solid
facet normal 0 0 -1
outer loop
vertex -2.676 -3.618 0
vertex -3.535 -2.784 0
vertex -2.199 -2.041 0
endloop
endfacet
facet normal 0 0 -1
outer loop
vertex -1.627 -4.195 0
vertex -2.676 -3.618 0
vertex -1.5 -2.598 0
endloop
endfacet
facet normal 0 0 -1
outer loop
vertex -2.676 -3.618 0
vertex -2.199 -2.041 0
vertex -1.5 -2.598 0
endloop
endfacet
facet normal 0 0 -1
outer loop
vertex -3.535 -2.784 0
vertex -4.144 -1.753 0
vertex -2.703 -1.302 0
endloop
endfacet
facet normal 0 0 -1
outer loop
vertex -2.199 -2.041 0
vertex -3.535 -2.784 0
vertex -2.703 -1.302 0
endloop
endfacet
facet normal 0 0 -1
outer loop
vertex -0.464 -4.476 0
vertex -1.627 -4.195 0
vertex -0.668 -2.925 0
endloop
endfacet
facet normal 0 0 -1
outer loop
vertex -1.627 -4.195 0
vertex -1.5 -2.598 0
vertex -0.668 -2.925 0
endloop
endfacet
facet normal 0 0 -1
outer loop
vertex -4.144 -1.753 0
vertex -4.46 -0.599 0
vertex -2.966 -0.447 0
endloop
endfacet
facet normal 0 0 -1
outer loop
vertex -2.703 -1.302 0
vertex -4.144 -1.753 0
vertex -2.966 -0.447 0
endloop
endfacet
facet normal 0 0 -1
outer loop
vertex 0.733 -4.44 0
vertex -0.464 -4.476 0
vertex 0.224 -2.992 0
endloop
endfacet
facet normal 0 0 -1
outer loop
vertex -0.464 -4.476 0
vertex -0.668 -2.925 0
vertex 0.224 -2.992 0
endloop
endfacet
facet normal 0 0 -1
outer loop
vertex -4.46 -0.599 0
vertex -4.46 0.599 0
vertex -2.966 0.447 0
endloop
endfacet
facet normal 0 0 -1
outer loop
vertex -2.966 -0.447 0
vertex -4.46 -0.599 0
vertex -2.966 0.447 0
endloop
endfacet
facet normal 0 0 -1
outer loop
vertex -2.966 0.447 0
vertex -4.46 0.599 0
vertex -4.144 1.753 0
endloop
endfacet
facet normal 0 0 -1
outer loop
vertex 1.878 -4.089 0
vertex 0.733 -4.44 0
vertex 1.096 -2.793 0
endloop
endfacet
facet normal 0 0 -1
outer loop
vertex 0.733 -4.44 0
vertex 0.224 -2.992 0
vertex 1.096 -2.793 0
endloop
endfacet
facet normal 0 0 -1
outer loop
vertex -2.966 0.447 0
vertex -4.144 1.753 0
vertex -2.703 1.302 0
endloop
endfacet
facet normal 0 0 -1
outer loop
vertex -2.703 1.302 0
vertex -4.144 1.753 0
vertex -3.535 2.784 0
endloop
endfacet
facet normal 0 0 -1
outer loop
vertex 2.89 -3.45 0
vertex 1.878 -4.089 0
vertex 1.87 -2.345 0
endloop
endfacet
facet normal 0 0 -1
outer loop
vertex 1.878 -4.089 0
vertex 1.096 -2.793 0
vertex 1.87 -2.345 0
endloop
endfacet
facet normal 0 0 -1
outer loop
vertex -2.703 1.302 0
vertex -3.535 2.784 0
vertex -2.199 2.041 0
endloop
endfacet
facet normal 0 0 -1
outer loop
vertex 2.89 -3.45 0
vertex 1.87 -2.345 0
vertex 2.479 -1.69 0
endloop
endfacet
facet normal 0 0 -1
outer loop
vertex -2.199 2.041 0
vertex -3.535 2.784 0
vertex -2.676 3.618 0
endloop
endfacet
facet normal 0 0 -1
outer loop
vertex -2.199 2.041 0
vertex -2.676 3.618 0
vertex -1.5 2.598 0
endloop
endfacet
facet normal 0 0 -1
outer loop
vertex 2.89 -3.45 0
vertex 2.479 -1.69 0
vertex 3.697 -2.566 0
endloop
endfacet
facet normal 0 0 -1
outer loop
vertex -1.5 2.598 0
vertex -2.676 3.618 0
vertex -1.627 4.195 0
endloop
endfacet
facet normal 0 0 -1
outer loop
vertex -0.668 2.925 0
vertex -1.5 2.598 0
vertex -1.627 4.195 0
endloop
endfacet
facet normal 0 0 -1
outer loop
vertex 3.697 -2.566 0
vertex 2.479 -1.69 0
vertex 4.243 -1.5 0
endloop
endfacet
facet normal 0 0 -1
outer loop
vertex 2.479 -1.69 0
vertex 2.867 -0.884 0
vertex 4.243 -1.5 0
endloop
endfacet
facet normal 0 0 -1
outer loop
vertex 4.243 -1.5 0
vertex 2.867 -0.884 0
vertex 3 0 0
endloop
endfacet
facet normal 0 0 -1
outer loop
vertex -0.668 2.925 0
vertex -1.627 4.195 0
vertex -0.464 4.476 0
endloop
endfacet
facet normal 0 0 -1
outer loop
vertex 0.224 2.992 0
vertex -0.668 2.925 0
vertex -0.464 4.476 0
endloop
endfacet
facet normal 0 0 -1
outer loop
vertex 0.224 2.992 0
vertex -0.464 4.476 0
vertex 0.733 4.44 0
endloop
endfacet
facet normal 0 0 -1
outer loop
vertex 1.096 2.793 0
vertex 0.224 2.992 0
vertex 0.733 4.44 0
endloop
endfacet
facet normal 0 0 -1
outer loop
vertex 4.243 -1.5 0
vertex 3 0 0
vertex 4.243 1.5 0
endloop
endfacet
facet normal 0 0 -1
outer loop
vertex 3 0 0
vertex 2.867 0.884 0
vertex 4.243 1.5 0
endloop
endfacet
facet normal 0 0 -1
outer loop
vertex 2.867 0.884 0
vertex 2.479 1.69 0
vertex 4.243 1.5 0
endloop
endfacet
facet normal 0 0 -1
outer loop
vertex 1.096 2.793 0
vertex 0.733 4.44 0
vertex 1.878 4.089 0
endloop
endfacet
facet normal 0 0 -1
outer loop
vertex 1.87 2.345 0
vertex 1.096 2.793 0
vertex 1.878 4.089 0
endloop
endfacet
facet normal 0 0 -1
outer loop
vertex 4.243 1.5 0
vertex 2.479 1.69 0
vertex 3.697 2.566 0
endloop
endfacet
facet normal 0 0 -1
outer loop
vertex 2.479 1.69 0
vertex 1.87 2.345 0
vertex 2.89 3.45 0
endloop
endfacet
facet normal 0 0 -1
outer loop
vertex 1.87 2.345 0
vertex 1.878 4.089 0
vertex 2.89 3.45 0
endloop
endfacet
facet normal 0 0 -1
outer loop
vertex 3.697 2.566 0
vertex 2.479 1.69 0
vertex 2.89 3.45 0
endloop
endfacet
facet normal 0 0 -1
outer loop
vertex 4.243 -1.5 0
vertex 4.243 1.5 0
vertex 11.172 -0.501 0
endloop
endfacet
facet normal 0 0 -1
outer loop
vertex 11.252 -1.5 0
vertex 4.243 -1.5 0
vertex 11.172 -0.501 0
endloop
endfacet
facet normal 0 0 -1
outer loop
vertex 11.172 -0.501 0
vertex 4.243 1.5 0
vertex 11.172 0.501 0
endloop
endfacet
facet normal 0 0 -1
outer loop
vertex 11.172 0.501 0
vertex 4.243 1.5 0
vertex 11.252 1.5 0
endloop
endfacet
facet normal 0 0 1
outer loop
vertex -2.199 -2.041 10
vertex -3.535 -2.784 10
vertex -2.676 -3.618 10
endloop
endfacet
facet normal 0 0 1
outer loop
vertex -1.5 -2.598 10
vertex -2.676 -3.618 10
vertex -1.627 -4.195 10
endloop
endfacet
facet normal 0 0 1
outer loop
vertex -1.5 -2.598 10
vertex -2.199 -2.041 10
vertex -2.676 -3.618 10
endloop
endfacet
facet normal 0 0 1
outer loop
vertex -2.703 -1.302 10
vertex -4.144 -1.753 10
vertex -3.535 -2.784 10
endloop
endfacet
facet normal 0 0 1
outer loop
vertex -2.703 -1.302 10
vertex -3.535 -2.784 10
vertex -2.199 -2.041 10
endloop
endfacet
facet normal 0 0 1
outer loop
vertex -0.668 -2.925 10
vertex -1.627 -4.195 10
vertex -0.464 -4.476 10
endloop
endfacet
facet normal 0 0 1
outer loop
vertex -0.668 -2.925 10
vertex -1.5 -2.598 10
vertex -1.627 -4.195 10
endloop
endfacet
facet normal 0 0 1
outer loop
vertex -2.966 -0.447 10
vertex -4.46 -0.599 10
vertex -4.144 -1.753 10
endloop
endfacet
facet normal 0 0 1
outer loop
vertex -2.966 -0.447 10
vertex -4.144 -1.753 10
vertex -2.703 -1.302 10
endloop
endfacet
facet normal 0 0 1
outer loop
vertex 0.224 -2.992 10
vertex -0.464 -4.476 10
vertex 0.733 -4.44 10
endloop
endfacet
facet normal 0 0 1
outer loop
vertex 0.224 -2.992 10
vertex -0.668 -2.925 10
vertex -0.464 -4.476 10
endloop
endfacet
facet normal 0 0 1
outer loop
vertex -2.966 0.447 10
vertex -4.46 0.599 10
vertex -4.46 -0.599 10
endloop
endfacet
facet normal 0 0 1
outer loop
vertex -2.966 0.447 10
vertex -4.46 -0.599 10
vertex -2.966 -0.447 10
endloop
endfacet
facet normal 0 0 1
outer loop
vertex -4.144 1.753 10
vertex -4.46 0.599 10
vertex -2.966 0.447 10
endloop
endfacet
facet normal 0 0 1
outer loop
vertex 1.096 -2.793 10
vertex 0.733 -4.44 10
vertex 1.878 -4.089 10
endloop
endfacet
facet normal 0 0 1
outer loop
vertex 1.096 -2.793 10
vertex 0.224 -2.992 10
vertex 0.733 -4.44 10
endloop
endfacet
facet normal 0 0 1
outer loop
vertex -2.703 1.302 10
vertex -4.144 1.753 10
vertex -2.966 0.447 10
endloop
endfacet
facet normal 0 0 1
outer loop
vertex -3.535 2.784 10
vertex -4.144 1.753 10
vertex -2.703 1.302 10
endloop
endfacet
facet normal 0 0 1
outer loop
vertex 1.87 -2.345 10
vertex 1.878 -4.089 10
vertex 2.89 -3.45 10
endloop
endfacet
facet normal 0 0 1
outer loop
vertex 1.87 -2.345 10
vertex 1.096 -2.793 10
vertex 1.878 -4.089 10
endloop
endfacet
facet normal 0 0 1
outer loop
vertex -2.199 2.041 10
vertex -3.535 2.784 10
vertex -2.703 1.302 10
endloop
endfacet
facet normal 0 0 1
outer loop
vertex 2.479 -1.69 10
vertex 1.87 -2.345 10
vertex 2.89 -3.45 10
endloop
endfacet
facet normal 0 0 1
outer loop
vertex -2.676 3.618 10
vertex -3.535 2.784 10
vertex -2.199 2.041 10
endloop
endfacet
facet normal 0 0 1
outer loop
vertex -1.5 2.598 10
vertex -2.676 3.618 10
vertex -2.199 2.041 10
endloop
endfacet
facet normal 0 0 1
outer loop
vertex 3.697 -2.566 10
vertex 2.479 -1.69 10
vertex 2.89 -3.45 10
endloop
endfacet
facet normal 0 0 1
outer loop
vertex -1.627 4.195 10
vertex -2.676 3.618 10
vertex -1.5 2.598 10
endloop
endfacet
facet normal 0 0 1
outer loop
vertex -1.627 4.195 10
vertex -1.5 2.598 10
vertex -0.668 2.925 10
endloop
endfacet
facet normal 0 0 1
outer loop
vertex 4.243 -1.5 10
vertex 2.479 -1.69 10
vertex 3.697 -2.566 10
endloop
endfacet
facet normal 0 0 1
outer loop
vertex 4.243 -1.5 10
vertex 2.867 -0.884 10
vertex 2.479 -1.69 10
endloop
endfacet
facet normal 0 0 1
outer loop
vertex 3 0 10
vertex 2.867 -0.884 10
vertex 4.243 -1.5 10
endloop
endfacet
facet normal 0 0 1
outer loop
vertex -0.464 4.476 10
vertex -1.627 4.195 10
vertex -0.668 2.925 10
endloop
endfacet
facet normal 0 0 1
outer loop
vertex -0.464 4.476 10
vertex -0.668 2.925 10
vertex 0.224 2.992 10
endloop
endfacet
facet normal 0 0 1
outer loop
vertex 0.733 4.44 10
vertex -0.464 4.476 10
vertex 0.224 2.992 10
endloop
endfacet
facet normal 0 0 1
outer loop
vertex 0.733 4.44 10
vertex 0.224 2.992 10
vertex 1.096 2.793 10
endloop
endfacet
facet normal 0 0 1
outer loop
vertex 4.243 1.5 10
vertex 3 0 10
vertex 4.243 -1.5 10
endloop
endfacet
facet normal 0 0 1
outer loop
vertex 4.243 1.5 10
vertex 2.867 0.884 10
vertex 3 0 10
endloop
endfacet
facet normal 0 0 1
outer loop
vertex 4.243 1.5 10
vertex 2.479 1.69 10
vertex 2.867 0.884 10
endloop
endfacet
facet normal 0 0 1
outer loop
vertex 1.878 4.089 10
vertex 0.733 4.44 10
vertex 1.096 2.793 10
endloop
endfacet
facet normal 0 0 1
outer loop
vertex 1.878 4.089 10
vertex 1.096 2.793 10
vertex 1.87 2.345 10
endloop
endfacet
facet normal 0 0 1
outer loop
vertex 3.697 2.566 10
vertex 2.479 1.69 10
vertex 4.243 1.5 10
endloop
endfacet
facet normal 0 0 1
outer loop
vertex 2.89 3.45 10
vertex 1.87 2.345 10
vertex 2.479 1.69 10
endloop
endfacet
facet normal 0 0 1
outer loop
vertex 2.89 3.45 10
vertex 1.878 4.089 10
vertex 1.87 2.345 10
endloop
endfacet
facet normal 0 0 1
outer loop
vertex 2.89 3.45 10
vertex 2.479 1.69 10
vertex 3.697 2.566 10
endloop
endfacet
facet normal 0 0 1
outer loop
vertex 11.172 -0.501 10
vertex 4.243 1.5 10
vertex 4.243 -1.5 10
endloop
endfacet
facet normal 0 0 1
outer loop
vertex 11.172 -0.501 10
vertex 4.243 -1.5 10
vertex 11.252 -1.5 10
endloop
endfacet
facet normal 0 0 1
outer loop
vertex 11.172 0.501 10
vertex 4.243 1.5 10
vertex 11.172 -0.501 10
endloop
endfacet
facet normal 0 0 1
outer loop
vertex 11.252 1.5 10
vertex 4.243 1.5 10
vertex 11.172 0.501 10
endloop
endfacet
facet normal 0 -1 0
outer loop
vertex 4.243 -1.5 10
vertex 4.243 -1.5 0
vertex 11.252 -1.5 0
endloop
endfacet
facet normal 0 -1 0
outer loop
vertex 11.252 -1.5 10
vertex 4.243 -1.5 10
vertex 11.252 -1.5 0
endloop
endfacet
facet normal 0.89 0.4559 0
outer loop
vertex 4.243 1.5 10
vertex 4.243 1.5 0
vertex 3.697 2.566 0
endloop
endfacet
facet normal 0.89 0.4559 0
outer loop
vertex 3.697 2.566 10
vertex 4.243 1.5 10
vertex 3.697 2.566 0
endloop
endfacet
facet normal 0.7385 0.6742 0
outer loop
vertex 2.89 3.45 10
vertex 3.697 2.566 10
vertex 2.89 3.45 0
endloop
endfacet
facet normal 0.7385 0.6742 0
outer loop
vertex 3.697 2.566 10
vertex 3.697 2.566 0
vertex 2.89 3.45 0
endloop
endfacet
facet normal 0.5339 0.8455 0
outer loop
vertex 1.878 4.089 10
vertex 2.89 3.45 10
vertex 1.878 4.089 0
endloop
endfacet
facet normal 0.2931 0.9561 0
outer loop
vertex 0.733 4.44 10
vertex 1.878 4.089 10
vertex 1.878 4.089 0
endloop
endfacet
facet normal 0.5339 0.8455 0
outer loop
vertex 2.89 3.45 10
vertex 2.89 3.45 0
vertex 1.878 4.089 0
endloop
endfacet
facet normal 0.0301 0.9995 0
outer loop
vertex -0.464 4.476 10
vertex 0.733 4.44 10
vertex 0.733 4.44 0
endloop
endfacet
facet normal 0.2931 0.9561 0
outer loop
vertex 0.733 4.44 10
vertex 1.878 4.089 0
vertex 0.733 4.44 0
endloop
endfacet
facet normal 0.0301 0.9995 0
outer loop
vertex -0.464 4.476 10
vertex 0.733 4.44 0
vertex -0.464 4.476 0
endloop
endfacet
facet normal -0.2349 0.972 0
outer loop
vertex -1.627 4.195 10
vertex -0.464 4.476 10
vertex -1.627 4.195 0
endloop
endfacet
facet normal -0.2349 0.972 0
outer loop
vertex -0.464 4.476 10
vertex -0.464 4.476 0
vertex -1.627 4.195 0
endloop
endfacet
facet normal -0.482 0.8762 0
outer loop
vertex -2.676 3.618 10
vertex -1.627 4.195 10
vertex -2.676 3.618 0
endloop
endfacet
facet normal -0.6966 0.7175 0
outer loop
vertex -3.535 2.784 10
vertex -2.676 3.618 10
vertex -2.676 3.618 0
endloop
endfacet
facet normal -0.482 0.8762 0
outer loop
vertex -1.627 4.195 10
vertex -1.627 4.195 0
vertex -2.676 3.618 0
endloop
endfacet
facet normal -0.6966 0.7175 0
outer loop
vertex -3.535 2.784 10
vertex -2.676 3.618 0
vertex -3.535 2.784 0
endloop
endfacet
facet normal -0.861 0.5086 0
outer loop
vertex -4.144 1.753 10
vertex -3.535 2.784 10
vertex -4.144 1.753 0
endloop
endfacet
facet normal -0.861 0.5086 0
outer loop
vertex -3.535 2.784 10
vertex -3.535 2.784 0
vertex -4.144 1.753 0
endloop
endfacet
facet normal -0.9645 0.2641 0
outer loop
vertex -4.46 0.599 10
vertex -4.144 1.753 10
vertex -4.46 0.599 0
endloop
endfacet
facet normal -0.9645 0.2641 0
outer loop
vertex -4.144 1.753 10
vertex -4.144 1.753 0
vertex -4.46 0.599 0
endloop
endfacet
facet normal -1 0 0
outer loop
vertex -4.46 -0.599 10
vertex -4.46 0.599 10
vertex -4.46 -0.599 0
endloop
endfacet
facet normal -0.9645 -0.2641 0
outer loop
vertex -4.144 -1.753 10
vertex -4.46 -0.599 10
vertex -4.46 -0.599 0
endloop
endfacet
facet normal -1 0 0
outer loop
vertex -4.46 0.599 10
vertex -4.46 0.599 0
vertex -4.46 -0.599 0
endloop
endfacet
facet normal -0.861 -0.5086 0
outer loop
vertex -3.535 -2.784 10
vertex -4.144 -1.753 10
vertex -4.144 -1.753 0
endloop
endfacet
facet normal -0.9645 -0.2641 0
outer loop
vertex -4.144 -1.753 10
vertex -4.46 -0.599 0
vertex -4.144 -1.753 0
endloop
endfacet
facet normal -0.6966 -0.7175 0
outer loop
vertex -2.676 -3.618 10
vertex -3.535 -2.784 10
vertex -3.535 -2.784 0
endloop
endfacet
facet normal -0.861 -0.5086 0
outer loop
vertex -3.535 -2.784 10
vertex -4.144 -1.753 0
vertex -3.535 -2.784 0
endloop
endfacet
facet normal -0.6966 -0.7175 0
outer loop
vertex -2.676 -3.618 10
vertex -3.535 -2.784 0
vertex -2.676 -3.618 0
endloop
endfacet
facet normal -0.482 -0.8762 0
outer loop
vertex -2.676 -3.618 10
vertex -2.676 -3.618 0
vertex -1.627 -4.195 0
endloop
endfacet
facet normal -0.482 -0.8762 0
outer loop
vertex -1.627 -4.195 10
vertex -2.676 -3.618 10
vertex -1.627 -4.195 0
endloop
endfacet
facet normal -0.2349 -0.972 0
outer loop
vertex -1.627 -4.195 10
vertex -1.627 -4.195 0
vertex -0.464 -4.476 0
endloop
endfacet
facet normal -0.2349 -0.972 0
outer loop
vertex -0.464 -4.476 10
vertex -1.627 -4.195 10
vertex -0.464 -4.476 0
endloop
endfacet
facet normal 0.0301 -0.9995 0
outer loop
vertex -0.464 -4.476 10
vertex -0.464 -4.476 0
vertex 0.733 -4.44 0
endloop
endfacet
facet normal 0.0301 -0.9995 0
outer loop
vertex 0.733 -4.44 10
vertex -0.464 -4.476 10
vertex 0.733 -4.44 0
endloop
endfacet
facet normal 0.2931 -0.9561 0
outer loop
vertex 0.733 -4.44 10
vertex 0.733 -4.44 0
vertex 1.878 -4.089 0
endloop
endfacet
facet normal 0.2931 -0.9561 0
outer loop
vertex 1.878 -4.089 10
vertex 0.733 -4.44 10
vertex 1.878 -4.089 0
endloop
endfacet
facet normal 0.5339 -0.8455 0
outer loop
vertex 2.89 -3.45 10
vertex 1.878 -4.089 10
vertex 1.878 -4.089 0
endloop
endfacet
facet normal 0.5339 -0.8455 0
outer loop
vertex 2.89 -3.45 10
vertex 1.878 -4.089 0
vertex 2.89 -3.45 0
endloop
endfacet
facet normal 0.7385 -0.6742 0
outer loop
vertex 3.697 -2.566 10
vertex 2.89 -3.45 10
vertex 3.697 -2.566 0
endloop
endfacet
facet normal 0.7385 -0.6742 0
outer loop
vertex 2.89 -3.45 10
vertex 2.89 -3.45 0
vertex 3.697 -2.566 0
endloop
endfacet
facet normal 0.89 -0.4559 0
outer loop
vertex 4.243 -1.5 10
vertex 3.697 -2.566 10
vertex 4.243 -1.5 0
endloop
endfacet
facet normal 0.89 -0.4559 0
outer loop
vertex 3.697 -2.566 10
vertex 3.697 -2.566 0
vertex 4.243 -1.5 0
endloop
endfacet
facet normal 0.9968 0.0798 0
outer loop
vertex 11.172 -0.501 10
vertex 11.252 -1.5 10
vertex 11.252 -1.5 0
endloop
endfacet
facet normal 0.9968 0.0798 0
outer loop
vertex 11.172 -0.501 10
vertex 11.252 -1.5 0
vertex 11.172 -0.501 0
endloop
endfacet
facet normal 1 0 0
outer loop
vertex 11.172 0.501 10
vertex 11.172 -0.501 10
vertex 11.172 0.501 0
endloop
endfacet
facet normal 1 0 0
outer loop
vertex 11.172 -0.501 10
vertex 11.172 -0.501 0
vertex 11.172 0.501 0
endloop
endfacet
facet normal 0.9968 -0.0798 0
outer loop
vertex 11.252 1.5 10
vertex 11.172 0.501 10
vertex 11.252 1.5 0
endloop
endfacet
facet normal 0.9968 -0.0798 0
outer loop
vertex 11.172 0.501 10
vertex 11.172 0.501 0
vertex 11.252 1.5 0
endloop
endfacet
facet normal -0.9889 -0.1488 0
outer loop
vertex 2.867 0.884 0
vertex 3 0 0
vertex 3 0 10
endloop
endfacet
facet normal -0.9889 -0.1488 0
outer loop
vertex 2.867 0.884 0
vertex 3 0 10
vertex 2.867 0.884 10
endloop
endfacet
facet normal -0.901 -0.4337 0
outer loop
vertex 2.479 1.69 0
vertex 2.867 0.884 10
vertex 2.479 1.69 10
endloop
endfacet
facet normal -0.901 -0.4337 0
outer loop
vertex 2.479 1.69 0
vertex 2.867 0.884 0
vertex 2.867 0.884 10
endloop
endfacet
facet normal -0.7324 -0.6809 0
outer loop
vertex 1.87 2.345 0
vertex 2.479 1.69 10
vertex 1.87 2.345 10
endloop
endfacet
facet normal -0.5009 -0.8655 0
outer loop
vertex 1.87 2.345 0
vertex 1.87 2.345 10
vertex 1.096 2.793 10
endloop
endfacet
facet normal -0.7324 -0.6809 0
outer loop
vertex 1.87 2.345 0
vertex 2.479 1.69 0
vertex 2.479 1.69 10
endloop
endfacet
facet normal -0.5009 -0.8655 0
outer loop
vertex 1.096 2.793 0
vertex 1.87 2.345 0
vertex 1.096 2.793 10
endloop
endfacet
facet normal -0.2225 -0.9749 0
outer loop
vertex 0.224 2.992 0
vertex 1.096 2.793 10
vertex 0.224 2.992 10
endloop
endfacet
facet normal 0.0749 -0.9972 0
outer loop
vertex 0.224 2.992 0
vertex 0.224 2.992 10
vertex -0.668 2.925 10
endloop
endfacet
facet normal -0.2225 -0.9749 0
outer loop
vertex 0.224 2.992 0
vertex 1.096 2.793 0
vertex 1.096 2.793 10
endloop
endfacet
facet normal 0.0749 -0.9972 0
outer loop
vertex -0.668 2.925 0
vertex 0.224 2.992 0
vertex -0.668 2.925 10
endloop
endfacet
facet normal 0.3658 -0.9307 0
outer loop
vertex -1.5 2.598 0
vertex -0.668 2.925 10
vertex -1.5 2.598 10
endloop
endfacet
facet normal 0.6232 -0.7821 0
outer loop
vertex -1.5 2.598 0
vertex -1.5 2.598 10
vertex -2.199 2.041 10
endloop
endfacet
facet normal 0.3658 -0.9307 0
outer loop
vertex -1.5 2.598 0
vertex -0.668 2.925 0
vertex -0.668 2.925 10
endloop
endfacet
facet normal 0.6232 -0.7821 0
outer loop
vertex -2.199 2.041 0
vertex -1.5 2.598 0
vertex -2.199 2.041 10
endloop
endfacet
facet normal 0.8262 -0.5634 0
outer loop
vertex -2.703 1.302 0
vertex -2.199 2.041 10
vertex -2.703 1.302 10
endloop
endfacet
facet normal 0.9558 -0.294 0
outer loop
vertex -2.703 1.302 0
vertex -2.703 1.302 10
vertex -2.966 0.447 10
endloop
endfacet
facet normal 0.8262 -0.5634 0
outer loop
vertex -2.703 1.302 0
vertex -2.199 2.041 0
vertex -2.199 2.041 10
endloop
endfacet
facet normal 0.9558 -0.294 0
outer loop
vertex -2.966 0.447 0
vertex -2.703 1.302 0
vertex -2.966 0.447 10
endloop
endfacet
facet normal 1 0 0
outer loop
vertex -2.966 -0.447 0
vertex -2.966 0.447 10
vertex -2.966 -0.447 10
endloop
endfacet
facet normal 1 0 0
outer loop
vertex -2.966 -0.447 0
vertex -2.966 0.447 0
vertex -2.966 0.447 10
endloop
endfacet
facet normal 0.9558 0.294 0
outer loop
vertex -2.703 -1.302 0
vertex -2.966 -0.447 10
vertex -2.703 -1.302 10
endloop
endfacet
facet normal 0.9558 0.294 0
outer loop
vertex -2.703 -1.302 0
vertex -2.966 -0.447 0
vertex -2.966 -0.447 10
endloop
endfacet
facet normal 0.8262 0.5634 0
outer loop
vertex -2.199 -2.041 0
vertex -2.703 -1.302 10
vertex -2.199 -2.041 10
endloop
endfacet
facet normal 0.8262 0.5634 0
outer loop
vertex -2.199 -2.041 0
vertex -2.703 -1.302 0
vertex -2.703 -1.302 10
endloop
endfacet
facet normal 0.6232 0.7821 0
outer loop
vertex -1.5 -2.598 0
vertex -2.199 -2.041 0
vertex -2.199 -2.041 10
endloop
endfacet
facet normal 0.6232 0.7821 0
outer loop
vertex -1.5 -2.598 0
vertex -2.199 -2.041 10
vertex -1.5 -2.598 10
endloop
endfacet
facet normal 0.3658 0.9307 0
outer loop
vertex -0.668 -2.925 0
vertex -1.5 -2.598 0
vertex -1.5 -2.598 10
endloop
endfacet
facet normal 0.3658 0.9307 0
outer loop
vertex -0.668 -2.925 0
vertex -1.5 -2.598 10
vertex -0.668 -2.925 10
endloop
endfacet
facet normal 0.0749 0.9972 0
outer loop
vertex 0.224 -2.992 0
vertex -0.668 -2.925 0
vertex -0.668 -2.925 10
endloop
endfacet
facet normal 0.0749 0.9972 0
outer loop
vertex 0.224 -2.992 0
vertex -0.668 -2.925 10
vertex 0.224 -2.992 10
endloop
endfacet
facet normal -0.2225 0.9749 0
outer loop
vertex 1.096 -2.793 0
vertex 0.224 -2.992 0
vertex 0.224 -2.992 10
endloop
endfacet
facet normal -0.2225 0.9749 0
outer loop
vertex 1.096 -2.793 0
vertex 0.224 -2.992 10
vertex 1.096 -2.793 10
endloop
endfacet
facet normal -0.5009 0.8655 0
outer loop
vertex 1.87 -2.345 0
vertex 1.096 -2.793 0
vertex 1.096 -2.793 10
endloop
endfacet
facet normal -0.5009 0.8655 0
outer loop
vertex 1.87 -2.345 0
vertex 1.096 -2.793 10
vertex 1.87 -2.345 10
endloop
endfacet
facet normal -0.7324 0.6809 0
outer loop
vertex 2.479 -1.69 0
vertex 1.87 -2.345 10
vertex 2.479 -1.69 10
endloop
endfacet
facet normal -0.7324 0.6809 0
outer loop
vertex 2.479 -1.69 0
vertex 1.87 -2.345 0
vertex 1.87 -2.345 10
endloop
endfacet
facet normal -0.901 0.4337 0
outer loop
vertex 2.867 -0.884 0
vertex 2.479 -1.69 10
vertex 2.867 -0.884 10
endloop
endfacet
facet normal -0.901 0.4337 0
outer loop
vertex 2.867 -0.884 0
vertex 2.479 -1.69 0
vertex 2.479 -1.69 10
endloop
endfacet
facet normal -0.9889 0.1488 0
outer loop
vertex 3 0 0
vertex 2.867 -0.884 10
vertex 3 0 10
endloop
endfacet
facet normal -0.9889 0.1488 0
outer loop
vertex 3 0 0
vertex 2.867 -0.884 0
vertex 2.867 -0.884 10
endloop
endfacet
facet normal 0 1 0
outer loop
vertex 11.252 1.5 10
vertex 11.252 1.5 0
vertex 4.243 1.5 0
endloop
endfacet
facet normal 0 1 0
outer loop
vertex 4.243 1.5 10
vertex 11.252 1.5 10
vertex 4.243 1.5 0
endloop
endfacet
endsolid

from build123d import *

# Parameters (mm, degrees)
F0_R     = 3
F1_DEPTH = 10


with BuildPart() as f1:
    # F0 (on Top) → F1 (new body)
    with BuildSketch(Plane.XY):
        with BuildLine():
            ThreePointArc((4.242641, -1.5), (4.435194, -0.760959), (4.5, 0))
            ThreePointArc((4.5, 0), (4.435194, 0.760959), (4.242641, 1.5))
            ThreePointArc((4.242641, 1.5), (-4.5, 0), (4.242641, -1.5))
        make_face()
        Circle(F0_R, mode=Mode.SUBTRACT)
        with BuildLine():
            ThreePointArc((4.242641, 1.5), (4.435194, 0.760959), (4.5, 0))
            ThreePointArc((4.5, 0), (4.435194, -0.760959), (4.242641, -1.5))
            Line((4.242641, -1.5), (11.25223, -1.5))
            ThreePointArc((11.25223, -1.5), (11.161904, 0), (11.25223, 1.5))
            Line((11.25223, 1.5), (4.242641, 1.5))
        make_face()
    extrude(amount=F1_DEPTH)


solid = f1.part
